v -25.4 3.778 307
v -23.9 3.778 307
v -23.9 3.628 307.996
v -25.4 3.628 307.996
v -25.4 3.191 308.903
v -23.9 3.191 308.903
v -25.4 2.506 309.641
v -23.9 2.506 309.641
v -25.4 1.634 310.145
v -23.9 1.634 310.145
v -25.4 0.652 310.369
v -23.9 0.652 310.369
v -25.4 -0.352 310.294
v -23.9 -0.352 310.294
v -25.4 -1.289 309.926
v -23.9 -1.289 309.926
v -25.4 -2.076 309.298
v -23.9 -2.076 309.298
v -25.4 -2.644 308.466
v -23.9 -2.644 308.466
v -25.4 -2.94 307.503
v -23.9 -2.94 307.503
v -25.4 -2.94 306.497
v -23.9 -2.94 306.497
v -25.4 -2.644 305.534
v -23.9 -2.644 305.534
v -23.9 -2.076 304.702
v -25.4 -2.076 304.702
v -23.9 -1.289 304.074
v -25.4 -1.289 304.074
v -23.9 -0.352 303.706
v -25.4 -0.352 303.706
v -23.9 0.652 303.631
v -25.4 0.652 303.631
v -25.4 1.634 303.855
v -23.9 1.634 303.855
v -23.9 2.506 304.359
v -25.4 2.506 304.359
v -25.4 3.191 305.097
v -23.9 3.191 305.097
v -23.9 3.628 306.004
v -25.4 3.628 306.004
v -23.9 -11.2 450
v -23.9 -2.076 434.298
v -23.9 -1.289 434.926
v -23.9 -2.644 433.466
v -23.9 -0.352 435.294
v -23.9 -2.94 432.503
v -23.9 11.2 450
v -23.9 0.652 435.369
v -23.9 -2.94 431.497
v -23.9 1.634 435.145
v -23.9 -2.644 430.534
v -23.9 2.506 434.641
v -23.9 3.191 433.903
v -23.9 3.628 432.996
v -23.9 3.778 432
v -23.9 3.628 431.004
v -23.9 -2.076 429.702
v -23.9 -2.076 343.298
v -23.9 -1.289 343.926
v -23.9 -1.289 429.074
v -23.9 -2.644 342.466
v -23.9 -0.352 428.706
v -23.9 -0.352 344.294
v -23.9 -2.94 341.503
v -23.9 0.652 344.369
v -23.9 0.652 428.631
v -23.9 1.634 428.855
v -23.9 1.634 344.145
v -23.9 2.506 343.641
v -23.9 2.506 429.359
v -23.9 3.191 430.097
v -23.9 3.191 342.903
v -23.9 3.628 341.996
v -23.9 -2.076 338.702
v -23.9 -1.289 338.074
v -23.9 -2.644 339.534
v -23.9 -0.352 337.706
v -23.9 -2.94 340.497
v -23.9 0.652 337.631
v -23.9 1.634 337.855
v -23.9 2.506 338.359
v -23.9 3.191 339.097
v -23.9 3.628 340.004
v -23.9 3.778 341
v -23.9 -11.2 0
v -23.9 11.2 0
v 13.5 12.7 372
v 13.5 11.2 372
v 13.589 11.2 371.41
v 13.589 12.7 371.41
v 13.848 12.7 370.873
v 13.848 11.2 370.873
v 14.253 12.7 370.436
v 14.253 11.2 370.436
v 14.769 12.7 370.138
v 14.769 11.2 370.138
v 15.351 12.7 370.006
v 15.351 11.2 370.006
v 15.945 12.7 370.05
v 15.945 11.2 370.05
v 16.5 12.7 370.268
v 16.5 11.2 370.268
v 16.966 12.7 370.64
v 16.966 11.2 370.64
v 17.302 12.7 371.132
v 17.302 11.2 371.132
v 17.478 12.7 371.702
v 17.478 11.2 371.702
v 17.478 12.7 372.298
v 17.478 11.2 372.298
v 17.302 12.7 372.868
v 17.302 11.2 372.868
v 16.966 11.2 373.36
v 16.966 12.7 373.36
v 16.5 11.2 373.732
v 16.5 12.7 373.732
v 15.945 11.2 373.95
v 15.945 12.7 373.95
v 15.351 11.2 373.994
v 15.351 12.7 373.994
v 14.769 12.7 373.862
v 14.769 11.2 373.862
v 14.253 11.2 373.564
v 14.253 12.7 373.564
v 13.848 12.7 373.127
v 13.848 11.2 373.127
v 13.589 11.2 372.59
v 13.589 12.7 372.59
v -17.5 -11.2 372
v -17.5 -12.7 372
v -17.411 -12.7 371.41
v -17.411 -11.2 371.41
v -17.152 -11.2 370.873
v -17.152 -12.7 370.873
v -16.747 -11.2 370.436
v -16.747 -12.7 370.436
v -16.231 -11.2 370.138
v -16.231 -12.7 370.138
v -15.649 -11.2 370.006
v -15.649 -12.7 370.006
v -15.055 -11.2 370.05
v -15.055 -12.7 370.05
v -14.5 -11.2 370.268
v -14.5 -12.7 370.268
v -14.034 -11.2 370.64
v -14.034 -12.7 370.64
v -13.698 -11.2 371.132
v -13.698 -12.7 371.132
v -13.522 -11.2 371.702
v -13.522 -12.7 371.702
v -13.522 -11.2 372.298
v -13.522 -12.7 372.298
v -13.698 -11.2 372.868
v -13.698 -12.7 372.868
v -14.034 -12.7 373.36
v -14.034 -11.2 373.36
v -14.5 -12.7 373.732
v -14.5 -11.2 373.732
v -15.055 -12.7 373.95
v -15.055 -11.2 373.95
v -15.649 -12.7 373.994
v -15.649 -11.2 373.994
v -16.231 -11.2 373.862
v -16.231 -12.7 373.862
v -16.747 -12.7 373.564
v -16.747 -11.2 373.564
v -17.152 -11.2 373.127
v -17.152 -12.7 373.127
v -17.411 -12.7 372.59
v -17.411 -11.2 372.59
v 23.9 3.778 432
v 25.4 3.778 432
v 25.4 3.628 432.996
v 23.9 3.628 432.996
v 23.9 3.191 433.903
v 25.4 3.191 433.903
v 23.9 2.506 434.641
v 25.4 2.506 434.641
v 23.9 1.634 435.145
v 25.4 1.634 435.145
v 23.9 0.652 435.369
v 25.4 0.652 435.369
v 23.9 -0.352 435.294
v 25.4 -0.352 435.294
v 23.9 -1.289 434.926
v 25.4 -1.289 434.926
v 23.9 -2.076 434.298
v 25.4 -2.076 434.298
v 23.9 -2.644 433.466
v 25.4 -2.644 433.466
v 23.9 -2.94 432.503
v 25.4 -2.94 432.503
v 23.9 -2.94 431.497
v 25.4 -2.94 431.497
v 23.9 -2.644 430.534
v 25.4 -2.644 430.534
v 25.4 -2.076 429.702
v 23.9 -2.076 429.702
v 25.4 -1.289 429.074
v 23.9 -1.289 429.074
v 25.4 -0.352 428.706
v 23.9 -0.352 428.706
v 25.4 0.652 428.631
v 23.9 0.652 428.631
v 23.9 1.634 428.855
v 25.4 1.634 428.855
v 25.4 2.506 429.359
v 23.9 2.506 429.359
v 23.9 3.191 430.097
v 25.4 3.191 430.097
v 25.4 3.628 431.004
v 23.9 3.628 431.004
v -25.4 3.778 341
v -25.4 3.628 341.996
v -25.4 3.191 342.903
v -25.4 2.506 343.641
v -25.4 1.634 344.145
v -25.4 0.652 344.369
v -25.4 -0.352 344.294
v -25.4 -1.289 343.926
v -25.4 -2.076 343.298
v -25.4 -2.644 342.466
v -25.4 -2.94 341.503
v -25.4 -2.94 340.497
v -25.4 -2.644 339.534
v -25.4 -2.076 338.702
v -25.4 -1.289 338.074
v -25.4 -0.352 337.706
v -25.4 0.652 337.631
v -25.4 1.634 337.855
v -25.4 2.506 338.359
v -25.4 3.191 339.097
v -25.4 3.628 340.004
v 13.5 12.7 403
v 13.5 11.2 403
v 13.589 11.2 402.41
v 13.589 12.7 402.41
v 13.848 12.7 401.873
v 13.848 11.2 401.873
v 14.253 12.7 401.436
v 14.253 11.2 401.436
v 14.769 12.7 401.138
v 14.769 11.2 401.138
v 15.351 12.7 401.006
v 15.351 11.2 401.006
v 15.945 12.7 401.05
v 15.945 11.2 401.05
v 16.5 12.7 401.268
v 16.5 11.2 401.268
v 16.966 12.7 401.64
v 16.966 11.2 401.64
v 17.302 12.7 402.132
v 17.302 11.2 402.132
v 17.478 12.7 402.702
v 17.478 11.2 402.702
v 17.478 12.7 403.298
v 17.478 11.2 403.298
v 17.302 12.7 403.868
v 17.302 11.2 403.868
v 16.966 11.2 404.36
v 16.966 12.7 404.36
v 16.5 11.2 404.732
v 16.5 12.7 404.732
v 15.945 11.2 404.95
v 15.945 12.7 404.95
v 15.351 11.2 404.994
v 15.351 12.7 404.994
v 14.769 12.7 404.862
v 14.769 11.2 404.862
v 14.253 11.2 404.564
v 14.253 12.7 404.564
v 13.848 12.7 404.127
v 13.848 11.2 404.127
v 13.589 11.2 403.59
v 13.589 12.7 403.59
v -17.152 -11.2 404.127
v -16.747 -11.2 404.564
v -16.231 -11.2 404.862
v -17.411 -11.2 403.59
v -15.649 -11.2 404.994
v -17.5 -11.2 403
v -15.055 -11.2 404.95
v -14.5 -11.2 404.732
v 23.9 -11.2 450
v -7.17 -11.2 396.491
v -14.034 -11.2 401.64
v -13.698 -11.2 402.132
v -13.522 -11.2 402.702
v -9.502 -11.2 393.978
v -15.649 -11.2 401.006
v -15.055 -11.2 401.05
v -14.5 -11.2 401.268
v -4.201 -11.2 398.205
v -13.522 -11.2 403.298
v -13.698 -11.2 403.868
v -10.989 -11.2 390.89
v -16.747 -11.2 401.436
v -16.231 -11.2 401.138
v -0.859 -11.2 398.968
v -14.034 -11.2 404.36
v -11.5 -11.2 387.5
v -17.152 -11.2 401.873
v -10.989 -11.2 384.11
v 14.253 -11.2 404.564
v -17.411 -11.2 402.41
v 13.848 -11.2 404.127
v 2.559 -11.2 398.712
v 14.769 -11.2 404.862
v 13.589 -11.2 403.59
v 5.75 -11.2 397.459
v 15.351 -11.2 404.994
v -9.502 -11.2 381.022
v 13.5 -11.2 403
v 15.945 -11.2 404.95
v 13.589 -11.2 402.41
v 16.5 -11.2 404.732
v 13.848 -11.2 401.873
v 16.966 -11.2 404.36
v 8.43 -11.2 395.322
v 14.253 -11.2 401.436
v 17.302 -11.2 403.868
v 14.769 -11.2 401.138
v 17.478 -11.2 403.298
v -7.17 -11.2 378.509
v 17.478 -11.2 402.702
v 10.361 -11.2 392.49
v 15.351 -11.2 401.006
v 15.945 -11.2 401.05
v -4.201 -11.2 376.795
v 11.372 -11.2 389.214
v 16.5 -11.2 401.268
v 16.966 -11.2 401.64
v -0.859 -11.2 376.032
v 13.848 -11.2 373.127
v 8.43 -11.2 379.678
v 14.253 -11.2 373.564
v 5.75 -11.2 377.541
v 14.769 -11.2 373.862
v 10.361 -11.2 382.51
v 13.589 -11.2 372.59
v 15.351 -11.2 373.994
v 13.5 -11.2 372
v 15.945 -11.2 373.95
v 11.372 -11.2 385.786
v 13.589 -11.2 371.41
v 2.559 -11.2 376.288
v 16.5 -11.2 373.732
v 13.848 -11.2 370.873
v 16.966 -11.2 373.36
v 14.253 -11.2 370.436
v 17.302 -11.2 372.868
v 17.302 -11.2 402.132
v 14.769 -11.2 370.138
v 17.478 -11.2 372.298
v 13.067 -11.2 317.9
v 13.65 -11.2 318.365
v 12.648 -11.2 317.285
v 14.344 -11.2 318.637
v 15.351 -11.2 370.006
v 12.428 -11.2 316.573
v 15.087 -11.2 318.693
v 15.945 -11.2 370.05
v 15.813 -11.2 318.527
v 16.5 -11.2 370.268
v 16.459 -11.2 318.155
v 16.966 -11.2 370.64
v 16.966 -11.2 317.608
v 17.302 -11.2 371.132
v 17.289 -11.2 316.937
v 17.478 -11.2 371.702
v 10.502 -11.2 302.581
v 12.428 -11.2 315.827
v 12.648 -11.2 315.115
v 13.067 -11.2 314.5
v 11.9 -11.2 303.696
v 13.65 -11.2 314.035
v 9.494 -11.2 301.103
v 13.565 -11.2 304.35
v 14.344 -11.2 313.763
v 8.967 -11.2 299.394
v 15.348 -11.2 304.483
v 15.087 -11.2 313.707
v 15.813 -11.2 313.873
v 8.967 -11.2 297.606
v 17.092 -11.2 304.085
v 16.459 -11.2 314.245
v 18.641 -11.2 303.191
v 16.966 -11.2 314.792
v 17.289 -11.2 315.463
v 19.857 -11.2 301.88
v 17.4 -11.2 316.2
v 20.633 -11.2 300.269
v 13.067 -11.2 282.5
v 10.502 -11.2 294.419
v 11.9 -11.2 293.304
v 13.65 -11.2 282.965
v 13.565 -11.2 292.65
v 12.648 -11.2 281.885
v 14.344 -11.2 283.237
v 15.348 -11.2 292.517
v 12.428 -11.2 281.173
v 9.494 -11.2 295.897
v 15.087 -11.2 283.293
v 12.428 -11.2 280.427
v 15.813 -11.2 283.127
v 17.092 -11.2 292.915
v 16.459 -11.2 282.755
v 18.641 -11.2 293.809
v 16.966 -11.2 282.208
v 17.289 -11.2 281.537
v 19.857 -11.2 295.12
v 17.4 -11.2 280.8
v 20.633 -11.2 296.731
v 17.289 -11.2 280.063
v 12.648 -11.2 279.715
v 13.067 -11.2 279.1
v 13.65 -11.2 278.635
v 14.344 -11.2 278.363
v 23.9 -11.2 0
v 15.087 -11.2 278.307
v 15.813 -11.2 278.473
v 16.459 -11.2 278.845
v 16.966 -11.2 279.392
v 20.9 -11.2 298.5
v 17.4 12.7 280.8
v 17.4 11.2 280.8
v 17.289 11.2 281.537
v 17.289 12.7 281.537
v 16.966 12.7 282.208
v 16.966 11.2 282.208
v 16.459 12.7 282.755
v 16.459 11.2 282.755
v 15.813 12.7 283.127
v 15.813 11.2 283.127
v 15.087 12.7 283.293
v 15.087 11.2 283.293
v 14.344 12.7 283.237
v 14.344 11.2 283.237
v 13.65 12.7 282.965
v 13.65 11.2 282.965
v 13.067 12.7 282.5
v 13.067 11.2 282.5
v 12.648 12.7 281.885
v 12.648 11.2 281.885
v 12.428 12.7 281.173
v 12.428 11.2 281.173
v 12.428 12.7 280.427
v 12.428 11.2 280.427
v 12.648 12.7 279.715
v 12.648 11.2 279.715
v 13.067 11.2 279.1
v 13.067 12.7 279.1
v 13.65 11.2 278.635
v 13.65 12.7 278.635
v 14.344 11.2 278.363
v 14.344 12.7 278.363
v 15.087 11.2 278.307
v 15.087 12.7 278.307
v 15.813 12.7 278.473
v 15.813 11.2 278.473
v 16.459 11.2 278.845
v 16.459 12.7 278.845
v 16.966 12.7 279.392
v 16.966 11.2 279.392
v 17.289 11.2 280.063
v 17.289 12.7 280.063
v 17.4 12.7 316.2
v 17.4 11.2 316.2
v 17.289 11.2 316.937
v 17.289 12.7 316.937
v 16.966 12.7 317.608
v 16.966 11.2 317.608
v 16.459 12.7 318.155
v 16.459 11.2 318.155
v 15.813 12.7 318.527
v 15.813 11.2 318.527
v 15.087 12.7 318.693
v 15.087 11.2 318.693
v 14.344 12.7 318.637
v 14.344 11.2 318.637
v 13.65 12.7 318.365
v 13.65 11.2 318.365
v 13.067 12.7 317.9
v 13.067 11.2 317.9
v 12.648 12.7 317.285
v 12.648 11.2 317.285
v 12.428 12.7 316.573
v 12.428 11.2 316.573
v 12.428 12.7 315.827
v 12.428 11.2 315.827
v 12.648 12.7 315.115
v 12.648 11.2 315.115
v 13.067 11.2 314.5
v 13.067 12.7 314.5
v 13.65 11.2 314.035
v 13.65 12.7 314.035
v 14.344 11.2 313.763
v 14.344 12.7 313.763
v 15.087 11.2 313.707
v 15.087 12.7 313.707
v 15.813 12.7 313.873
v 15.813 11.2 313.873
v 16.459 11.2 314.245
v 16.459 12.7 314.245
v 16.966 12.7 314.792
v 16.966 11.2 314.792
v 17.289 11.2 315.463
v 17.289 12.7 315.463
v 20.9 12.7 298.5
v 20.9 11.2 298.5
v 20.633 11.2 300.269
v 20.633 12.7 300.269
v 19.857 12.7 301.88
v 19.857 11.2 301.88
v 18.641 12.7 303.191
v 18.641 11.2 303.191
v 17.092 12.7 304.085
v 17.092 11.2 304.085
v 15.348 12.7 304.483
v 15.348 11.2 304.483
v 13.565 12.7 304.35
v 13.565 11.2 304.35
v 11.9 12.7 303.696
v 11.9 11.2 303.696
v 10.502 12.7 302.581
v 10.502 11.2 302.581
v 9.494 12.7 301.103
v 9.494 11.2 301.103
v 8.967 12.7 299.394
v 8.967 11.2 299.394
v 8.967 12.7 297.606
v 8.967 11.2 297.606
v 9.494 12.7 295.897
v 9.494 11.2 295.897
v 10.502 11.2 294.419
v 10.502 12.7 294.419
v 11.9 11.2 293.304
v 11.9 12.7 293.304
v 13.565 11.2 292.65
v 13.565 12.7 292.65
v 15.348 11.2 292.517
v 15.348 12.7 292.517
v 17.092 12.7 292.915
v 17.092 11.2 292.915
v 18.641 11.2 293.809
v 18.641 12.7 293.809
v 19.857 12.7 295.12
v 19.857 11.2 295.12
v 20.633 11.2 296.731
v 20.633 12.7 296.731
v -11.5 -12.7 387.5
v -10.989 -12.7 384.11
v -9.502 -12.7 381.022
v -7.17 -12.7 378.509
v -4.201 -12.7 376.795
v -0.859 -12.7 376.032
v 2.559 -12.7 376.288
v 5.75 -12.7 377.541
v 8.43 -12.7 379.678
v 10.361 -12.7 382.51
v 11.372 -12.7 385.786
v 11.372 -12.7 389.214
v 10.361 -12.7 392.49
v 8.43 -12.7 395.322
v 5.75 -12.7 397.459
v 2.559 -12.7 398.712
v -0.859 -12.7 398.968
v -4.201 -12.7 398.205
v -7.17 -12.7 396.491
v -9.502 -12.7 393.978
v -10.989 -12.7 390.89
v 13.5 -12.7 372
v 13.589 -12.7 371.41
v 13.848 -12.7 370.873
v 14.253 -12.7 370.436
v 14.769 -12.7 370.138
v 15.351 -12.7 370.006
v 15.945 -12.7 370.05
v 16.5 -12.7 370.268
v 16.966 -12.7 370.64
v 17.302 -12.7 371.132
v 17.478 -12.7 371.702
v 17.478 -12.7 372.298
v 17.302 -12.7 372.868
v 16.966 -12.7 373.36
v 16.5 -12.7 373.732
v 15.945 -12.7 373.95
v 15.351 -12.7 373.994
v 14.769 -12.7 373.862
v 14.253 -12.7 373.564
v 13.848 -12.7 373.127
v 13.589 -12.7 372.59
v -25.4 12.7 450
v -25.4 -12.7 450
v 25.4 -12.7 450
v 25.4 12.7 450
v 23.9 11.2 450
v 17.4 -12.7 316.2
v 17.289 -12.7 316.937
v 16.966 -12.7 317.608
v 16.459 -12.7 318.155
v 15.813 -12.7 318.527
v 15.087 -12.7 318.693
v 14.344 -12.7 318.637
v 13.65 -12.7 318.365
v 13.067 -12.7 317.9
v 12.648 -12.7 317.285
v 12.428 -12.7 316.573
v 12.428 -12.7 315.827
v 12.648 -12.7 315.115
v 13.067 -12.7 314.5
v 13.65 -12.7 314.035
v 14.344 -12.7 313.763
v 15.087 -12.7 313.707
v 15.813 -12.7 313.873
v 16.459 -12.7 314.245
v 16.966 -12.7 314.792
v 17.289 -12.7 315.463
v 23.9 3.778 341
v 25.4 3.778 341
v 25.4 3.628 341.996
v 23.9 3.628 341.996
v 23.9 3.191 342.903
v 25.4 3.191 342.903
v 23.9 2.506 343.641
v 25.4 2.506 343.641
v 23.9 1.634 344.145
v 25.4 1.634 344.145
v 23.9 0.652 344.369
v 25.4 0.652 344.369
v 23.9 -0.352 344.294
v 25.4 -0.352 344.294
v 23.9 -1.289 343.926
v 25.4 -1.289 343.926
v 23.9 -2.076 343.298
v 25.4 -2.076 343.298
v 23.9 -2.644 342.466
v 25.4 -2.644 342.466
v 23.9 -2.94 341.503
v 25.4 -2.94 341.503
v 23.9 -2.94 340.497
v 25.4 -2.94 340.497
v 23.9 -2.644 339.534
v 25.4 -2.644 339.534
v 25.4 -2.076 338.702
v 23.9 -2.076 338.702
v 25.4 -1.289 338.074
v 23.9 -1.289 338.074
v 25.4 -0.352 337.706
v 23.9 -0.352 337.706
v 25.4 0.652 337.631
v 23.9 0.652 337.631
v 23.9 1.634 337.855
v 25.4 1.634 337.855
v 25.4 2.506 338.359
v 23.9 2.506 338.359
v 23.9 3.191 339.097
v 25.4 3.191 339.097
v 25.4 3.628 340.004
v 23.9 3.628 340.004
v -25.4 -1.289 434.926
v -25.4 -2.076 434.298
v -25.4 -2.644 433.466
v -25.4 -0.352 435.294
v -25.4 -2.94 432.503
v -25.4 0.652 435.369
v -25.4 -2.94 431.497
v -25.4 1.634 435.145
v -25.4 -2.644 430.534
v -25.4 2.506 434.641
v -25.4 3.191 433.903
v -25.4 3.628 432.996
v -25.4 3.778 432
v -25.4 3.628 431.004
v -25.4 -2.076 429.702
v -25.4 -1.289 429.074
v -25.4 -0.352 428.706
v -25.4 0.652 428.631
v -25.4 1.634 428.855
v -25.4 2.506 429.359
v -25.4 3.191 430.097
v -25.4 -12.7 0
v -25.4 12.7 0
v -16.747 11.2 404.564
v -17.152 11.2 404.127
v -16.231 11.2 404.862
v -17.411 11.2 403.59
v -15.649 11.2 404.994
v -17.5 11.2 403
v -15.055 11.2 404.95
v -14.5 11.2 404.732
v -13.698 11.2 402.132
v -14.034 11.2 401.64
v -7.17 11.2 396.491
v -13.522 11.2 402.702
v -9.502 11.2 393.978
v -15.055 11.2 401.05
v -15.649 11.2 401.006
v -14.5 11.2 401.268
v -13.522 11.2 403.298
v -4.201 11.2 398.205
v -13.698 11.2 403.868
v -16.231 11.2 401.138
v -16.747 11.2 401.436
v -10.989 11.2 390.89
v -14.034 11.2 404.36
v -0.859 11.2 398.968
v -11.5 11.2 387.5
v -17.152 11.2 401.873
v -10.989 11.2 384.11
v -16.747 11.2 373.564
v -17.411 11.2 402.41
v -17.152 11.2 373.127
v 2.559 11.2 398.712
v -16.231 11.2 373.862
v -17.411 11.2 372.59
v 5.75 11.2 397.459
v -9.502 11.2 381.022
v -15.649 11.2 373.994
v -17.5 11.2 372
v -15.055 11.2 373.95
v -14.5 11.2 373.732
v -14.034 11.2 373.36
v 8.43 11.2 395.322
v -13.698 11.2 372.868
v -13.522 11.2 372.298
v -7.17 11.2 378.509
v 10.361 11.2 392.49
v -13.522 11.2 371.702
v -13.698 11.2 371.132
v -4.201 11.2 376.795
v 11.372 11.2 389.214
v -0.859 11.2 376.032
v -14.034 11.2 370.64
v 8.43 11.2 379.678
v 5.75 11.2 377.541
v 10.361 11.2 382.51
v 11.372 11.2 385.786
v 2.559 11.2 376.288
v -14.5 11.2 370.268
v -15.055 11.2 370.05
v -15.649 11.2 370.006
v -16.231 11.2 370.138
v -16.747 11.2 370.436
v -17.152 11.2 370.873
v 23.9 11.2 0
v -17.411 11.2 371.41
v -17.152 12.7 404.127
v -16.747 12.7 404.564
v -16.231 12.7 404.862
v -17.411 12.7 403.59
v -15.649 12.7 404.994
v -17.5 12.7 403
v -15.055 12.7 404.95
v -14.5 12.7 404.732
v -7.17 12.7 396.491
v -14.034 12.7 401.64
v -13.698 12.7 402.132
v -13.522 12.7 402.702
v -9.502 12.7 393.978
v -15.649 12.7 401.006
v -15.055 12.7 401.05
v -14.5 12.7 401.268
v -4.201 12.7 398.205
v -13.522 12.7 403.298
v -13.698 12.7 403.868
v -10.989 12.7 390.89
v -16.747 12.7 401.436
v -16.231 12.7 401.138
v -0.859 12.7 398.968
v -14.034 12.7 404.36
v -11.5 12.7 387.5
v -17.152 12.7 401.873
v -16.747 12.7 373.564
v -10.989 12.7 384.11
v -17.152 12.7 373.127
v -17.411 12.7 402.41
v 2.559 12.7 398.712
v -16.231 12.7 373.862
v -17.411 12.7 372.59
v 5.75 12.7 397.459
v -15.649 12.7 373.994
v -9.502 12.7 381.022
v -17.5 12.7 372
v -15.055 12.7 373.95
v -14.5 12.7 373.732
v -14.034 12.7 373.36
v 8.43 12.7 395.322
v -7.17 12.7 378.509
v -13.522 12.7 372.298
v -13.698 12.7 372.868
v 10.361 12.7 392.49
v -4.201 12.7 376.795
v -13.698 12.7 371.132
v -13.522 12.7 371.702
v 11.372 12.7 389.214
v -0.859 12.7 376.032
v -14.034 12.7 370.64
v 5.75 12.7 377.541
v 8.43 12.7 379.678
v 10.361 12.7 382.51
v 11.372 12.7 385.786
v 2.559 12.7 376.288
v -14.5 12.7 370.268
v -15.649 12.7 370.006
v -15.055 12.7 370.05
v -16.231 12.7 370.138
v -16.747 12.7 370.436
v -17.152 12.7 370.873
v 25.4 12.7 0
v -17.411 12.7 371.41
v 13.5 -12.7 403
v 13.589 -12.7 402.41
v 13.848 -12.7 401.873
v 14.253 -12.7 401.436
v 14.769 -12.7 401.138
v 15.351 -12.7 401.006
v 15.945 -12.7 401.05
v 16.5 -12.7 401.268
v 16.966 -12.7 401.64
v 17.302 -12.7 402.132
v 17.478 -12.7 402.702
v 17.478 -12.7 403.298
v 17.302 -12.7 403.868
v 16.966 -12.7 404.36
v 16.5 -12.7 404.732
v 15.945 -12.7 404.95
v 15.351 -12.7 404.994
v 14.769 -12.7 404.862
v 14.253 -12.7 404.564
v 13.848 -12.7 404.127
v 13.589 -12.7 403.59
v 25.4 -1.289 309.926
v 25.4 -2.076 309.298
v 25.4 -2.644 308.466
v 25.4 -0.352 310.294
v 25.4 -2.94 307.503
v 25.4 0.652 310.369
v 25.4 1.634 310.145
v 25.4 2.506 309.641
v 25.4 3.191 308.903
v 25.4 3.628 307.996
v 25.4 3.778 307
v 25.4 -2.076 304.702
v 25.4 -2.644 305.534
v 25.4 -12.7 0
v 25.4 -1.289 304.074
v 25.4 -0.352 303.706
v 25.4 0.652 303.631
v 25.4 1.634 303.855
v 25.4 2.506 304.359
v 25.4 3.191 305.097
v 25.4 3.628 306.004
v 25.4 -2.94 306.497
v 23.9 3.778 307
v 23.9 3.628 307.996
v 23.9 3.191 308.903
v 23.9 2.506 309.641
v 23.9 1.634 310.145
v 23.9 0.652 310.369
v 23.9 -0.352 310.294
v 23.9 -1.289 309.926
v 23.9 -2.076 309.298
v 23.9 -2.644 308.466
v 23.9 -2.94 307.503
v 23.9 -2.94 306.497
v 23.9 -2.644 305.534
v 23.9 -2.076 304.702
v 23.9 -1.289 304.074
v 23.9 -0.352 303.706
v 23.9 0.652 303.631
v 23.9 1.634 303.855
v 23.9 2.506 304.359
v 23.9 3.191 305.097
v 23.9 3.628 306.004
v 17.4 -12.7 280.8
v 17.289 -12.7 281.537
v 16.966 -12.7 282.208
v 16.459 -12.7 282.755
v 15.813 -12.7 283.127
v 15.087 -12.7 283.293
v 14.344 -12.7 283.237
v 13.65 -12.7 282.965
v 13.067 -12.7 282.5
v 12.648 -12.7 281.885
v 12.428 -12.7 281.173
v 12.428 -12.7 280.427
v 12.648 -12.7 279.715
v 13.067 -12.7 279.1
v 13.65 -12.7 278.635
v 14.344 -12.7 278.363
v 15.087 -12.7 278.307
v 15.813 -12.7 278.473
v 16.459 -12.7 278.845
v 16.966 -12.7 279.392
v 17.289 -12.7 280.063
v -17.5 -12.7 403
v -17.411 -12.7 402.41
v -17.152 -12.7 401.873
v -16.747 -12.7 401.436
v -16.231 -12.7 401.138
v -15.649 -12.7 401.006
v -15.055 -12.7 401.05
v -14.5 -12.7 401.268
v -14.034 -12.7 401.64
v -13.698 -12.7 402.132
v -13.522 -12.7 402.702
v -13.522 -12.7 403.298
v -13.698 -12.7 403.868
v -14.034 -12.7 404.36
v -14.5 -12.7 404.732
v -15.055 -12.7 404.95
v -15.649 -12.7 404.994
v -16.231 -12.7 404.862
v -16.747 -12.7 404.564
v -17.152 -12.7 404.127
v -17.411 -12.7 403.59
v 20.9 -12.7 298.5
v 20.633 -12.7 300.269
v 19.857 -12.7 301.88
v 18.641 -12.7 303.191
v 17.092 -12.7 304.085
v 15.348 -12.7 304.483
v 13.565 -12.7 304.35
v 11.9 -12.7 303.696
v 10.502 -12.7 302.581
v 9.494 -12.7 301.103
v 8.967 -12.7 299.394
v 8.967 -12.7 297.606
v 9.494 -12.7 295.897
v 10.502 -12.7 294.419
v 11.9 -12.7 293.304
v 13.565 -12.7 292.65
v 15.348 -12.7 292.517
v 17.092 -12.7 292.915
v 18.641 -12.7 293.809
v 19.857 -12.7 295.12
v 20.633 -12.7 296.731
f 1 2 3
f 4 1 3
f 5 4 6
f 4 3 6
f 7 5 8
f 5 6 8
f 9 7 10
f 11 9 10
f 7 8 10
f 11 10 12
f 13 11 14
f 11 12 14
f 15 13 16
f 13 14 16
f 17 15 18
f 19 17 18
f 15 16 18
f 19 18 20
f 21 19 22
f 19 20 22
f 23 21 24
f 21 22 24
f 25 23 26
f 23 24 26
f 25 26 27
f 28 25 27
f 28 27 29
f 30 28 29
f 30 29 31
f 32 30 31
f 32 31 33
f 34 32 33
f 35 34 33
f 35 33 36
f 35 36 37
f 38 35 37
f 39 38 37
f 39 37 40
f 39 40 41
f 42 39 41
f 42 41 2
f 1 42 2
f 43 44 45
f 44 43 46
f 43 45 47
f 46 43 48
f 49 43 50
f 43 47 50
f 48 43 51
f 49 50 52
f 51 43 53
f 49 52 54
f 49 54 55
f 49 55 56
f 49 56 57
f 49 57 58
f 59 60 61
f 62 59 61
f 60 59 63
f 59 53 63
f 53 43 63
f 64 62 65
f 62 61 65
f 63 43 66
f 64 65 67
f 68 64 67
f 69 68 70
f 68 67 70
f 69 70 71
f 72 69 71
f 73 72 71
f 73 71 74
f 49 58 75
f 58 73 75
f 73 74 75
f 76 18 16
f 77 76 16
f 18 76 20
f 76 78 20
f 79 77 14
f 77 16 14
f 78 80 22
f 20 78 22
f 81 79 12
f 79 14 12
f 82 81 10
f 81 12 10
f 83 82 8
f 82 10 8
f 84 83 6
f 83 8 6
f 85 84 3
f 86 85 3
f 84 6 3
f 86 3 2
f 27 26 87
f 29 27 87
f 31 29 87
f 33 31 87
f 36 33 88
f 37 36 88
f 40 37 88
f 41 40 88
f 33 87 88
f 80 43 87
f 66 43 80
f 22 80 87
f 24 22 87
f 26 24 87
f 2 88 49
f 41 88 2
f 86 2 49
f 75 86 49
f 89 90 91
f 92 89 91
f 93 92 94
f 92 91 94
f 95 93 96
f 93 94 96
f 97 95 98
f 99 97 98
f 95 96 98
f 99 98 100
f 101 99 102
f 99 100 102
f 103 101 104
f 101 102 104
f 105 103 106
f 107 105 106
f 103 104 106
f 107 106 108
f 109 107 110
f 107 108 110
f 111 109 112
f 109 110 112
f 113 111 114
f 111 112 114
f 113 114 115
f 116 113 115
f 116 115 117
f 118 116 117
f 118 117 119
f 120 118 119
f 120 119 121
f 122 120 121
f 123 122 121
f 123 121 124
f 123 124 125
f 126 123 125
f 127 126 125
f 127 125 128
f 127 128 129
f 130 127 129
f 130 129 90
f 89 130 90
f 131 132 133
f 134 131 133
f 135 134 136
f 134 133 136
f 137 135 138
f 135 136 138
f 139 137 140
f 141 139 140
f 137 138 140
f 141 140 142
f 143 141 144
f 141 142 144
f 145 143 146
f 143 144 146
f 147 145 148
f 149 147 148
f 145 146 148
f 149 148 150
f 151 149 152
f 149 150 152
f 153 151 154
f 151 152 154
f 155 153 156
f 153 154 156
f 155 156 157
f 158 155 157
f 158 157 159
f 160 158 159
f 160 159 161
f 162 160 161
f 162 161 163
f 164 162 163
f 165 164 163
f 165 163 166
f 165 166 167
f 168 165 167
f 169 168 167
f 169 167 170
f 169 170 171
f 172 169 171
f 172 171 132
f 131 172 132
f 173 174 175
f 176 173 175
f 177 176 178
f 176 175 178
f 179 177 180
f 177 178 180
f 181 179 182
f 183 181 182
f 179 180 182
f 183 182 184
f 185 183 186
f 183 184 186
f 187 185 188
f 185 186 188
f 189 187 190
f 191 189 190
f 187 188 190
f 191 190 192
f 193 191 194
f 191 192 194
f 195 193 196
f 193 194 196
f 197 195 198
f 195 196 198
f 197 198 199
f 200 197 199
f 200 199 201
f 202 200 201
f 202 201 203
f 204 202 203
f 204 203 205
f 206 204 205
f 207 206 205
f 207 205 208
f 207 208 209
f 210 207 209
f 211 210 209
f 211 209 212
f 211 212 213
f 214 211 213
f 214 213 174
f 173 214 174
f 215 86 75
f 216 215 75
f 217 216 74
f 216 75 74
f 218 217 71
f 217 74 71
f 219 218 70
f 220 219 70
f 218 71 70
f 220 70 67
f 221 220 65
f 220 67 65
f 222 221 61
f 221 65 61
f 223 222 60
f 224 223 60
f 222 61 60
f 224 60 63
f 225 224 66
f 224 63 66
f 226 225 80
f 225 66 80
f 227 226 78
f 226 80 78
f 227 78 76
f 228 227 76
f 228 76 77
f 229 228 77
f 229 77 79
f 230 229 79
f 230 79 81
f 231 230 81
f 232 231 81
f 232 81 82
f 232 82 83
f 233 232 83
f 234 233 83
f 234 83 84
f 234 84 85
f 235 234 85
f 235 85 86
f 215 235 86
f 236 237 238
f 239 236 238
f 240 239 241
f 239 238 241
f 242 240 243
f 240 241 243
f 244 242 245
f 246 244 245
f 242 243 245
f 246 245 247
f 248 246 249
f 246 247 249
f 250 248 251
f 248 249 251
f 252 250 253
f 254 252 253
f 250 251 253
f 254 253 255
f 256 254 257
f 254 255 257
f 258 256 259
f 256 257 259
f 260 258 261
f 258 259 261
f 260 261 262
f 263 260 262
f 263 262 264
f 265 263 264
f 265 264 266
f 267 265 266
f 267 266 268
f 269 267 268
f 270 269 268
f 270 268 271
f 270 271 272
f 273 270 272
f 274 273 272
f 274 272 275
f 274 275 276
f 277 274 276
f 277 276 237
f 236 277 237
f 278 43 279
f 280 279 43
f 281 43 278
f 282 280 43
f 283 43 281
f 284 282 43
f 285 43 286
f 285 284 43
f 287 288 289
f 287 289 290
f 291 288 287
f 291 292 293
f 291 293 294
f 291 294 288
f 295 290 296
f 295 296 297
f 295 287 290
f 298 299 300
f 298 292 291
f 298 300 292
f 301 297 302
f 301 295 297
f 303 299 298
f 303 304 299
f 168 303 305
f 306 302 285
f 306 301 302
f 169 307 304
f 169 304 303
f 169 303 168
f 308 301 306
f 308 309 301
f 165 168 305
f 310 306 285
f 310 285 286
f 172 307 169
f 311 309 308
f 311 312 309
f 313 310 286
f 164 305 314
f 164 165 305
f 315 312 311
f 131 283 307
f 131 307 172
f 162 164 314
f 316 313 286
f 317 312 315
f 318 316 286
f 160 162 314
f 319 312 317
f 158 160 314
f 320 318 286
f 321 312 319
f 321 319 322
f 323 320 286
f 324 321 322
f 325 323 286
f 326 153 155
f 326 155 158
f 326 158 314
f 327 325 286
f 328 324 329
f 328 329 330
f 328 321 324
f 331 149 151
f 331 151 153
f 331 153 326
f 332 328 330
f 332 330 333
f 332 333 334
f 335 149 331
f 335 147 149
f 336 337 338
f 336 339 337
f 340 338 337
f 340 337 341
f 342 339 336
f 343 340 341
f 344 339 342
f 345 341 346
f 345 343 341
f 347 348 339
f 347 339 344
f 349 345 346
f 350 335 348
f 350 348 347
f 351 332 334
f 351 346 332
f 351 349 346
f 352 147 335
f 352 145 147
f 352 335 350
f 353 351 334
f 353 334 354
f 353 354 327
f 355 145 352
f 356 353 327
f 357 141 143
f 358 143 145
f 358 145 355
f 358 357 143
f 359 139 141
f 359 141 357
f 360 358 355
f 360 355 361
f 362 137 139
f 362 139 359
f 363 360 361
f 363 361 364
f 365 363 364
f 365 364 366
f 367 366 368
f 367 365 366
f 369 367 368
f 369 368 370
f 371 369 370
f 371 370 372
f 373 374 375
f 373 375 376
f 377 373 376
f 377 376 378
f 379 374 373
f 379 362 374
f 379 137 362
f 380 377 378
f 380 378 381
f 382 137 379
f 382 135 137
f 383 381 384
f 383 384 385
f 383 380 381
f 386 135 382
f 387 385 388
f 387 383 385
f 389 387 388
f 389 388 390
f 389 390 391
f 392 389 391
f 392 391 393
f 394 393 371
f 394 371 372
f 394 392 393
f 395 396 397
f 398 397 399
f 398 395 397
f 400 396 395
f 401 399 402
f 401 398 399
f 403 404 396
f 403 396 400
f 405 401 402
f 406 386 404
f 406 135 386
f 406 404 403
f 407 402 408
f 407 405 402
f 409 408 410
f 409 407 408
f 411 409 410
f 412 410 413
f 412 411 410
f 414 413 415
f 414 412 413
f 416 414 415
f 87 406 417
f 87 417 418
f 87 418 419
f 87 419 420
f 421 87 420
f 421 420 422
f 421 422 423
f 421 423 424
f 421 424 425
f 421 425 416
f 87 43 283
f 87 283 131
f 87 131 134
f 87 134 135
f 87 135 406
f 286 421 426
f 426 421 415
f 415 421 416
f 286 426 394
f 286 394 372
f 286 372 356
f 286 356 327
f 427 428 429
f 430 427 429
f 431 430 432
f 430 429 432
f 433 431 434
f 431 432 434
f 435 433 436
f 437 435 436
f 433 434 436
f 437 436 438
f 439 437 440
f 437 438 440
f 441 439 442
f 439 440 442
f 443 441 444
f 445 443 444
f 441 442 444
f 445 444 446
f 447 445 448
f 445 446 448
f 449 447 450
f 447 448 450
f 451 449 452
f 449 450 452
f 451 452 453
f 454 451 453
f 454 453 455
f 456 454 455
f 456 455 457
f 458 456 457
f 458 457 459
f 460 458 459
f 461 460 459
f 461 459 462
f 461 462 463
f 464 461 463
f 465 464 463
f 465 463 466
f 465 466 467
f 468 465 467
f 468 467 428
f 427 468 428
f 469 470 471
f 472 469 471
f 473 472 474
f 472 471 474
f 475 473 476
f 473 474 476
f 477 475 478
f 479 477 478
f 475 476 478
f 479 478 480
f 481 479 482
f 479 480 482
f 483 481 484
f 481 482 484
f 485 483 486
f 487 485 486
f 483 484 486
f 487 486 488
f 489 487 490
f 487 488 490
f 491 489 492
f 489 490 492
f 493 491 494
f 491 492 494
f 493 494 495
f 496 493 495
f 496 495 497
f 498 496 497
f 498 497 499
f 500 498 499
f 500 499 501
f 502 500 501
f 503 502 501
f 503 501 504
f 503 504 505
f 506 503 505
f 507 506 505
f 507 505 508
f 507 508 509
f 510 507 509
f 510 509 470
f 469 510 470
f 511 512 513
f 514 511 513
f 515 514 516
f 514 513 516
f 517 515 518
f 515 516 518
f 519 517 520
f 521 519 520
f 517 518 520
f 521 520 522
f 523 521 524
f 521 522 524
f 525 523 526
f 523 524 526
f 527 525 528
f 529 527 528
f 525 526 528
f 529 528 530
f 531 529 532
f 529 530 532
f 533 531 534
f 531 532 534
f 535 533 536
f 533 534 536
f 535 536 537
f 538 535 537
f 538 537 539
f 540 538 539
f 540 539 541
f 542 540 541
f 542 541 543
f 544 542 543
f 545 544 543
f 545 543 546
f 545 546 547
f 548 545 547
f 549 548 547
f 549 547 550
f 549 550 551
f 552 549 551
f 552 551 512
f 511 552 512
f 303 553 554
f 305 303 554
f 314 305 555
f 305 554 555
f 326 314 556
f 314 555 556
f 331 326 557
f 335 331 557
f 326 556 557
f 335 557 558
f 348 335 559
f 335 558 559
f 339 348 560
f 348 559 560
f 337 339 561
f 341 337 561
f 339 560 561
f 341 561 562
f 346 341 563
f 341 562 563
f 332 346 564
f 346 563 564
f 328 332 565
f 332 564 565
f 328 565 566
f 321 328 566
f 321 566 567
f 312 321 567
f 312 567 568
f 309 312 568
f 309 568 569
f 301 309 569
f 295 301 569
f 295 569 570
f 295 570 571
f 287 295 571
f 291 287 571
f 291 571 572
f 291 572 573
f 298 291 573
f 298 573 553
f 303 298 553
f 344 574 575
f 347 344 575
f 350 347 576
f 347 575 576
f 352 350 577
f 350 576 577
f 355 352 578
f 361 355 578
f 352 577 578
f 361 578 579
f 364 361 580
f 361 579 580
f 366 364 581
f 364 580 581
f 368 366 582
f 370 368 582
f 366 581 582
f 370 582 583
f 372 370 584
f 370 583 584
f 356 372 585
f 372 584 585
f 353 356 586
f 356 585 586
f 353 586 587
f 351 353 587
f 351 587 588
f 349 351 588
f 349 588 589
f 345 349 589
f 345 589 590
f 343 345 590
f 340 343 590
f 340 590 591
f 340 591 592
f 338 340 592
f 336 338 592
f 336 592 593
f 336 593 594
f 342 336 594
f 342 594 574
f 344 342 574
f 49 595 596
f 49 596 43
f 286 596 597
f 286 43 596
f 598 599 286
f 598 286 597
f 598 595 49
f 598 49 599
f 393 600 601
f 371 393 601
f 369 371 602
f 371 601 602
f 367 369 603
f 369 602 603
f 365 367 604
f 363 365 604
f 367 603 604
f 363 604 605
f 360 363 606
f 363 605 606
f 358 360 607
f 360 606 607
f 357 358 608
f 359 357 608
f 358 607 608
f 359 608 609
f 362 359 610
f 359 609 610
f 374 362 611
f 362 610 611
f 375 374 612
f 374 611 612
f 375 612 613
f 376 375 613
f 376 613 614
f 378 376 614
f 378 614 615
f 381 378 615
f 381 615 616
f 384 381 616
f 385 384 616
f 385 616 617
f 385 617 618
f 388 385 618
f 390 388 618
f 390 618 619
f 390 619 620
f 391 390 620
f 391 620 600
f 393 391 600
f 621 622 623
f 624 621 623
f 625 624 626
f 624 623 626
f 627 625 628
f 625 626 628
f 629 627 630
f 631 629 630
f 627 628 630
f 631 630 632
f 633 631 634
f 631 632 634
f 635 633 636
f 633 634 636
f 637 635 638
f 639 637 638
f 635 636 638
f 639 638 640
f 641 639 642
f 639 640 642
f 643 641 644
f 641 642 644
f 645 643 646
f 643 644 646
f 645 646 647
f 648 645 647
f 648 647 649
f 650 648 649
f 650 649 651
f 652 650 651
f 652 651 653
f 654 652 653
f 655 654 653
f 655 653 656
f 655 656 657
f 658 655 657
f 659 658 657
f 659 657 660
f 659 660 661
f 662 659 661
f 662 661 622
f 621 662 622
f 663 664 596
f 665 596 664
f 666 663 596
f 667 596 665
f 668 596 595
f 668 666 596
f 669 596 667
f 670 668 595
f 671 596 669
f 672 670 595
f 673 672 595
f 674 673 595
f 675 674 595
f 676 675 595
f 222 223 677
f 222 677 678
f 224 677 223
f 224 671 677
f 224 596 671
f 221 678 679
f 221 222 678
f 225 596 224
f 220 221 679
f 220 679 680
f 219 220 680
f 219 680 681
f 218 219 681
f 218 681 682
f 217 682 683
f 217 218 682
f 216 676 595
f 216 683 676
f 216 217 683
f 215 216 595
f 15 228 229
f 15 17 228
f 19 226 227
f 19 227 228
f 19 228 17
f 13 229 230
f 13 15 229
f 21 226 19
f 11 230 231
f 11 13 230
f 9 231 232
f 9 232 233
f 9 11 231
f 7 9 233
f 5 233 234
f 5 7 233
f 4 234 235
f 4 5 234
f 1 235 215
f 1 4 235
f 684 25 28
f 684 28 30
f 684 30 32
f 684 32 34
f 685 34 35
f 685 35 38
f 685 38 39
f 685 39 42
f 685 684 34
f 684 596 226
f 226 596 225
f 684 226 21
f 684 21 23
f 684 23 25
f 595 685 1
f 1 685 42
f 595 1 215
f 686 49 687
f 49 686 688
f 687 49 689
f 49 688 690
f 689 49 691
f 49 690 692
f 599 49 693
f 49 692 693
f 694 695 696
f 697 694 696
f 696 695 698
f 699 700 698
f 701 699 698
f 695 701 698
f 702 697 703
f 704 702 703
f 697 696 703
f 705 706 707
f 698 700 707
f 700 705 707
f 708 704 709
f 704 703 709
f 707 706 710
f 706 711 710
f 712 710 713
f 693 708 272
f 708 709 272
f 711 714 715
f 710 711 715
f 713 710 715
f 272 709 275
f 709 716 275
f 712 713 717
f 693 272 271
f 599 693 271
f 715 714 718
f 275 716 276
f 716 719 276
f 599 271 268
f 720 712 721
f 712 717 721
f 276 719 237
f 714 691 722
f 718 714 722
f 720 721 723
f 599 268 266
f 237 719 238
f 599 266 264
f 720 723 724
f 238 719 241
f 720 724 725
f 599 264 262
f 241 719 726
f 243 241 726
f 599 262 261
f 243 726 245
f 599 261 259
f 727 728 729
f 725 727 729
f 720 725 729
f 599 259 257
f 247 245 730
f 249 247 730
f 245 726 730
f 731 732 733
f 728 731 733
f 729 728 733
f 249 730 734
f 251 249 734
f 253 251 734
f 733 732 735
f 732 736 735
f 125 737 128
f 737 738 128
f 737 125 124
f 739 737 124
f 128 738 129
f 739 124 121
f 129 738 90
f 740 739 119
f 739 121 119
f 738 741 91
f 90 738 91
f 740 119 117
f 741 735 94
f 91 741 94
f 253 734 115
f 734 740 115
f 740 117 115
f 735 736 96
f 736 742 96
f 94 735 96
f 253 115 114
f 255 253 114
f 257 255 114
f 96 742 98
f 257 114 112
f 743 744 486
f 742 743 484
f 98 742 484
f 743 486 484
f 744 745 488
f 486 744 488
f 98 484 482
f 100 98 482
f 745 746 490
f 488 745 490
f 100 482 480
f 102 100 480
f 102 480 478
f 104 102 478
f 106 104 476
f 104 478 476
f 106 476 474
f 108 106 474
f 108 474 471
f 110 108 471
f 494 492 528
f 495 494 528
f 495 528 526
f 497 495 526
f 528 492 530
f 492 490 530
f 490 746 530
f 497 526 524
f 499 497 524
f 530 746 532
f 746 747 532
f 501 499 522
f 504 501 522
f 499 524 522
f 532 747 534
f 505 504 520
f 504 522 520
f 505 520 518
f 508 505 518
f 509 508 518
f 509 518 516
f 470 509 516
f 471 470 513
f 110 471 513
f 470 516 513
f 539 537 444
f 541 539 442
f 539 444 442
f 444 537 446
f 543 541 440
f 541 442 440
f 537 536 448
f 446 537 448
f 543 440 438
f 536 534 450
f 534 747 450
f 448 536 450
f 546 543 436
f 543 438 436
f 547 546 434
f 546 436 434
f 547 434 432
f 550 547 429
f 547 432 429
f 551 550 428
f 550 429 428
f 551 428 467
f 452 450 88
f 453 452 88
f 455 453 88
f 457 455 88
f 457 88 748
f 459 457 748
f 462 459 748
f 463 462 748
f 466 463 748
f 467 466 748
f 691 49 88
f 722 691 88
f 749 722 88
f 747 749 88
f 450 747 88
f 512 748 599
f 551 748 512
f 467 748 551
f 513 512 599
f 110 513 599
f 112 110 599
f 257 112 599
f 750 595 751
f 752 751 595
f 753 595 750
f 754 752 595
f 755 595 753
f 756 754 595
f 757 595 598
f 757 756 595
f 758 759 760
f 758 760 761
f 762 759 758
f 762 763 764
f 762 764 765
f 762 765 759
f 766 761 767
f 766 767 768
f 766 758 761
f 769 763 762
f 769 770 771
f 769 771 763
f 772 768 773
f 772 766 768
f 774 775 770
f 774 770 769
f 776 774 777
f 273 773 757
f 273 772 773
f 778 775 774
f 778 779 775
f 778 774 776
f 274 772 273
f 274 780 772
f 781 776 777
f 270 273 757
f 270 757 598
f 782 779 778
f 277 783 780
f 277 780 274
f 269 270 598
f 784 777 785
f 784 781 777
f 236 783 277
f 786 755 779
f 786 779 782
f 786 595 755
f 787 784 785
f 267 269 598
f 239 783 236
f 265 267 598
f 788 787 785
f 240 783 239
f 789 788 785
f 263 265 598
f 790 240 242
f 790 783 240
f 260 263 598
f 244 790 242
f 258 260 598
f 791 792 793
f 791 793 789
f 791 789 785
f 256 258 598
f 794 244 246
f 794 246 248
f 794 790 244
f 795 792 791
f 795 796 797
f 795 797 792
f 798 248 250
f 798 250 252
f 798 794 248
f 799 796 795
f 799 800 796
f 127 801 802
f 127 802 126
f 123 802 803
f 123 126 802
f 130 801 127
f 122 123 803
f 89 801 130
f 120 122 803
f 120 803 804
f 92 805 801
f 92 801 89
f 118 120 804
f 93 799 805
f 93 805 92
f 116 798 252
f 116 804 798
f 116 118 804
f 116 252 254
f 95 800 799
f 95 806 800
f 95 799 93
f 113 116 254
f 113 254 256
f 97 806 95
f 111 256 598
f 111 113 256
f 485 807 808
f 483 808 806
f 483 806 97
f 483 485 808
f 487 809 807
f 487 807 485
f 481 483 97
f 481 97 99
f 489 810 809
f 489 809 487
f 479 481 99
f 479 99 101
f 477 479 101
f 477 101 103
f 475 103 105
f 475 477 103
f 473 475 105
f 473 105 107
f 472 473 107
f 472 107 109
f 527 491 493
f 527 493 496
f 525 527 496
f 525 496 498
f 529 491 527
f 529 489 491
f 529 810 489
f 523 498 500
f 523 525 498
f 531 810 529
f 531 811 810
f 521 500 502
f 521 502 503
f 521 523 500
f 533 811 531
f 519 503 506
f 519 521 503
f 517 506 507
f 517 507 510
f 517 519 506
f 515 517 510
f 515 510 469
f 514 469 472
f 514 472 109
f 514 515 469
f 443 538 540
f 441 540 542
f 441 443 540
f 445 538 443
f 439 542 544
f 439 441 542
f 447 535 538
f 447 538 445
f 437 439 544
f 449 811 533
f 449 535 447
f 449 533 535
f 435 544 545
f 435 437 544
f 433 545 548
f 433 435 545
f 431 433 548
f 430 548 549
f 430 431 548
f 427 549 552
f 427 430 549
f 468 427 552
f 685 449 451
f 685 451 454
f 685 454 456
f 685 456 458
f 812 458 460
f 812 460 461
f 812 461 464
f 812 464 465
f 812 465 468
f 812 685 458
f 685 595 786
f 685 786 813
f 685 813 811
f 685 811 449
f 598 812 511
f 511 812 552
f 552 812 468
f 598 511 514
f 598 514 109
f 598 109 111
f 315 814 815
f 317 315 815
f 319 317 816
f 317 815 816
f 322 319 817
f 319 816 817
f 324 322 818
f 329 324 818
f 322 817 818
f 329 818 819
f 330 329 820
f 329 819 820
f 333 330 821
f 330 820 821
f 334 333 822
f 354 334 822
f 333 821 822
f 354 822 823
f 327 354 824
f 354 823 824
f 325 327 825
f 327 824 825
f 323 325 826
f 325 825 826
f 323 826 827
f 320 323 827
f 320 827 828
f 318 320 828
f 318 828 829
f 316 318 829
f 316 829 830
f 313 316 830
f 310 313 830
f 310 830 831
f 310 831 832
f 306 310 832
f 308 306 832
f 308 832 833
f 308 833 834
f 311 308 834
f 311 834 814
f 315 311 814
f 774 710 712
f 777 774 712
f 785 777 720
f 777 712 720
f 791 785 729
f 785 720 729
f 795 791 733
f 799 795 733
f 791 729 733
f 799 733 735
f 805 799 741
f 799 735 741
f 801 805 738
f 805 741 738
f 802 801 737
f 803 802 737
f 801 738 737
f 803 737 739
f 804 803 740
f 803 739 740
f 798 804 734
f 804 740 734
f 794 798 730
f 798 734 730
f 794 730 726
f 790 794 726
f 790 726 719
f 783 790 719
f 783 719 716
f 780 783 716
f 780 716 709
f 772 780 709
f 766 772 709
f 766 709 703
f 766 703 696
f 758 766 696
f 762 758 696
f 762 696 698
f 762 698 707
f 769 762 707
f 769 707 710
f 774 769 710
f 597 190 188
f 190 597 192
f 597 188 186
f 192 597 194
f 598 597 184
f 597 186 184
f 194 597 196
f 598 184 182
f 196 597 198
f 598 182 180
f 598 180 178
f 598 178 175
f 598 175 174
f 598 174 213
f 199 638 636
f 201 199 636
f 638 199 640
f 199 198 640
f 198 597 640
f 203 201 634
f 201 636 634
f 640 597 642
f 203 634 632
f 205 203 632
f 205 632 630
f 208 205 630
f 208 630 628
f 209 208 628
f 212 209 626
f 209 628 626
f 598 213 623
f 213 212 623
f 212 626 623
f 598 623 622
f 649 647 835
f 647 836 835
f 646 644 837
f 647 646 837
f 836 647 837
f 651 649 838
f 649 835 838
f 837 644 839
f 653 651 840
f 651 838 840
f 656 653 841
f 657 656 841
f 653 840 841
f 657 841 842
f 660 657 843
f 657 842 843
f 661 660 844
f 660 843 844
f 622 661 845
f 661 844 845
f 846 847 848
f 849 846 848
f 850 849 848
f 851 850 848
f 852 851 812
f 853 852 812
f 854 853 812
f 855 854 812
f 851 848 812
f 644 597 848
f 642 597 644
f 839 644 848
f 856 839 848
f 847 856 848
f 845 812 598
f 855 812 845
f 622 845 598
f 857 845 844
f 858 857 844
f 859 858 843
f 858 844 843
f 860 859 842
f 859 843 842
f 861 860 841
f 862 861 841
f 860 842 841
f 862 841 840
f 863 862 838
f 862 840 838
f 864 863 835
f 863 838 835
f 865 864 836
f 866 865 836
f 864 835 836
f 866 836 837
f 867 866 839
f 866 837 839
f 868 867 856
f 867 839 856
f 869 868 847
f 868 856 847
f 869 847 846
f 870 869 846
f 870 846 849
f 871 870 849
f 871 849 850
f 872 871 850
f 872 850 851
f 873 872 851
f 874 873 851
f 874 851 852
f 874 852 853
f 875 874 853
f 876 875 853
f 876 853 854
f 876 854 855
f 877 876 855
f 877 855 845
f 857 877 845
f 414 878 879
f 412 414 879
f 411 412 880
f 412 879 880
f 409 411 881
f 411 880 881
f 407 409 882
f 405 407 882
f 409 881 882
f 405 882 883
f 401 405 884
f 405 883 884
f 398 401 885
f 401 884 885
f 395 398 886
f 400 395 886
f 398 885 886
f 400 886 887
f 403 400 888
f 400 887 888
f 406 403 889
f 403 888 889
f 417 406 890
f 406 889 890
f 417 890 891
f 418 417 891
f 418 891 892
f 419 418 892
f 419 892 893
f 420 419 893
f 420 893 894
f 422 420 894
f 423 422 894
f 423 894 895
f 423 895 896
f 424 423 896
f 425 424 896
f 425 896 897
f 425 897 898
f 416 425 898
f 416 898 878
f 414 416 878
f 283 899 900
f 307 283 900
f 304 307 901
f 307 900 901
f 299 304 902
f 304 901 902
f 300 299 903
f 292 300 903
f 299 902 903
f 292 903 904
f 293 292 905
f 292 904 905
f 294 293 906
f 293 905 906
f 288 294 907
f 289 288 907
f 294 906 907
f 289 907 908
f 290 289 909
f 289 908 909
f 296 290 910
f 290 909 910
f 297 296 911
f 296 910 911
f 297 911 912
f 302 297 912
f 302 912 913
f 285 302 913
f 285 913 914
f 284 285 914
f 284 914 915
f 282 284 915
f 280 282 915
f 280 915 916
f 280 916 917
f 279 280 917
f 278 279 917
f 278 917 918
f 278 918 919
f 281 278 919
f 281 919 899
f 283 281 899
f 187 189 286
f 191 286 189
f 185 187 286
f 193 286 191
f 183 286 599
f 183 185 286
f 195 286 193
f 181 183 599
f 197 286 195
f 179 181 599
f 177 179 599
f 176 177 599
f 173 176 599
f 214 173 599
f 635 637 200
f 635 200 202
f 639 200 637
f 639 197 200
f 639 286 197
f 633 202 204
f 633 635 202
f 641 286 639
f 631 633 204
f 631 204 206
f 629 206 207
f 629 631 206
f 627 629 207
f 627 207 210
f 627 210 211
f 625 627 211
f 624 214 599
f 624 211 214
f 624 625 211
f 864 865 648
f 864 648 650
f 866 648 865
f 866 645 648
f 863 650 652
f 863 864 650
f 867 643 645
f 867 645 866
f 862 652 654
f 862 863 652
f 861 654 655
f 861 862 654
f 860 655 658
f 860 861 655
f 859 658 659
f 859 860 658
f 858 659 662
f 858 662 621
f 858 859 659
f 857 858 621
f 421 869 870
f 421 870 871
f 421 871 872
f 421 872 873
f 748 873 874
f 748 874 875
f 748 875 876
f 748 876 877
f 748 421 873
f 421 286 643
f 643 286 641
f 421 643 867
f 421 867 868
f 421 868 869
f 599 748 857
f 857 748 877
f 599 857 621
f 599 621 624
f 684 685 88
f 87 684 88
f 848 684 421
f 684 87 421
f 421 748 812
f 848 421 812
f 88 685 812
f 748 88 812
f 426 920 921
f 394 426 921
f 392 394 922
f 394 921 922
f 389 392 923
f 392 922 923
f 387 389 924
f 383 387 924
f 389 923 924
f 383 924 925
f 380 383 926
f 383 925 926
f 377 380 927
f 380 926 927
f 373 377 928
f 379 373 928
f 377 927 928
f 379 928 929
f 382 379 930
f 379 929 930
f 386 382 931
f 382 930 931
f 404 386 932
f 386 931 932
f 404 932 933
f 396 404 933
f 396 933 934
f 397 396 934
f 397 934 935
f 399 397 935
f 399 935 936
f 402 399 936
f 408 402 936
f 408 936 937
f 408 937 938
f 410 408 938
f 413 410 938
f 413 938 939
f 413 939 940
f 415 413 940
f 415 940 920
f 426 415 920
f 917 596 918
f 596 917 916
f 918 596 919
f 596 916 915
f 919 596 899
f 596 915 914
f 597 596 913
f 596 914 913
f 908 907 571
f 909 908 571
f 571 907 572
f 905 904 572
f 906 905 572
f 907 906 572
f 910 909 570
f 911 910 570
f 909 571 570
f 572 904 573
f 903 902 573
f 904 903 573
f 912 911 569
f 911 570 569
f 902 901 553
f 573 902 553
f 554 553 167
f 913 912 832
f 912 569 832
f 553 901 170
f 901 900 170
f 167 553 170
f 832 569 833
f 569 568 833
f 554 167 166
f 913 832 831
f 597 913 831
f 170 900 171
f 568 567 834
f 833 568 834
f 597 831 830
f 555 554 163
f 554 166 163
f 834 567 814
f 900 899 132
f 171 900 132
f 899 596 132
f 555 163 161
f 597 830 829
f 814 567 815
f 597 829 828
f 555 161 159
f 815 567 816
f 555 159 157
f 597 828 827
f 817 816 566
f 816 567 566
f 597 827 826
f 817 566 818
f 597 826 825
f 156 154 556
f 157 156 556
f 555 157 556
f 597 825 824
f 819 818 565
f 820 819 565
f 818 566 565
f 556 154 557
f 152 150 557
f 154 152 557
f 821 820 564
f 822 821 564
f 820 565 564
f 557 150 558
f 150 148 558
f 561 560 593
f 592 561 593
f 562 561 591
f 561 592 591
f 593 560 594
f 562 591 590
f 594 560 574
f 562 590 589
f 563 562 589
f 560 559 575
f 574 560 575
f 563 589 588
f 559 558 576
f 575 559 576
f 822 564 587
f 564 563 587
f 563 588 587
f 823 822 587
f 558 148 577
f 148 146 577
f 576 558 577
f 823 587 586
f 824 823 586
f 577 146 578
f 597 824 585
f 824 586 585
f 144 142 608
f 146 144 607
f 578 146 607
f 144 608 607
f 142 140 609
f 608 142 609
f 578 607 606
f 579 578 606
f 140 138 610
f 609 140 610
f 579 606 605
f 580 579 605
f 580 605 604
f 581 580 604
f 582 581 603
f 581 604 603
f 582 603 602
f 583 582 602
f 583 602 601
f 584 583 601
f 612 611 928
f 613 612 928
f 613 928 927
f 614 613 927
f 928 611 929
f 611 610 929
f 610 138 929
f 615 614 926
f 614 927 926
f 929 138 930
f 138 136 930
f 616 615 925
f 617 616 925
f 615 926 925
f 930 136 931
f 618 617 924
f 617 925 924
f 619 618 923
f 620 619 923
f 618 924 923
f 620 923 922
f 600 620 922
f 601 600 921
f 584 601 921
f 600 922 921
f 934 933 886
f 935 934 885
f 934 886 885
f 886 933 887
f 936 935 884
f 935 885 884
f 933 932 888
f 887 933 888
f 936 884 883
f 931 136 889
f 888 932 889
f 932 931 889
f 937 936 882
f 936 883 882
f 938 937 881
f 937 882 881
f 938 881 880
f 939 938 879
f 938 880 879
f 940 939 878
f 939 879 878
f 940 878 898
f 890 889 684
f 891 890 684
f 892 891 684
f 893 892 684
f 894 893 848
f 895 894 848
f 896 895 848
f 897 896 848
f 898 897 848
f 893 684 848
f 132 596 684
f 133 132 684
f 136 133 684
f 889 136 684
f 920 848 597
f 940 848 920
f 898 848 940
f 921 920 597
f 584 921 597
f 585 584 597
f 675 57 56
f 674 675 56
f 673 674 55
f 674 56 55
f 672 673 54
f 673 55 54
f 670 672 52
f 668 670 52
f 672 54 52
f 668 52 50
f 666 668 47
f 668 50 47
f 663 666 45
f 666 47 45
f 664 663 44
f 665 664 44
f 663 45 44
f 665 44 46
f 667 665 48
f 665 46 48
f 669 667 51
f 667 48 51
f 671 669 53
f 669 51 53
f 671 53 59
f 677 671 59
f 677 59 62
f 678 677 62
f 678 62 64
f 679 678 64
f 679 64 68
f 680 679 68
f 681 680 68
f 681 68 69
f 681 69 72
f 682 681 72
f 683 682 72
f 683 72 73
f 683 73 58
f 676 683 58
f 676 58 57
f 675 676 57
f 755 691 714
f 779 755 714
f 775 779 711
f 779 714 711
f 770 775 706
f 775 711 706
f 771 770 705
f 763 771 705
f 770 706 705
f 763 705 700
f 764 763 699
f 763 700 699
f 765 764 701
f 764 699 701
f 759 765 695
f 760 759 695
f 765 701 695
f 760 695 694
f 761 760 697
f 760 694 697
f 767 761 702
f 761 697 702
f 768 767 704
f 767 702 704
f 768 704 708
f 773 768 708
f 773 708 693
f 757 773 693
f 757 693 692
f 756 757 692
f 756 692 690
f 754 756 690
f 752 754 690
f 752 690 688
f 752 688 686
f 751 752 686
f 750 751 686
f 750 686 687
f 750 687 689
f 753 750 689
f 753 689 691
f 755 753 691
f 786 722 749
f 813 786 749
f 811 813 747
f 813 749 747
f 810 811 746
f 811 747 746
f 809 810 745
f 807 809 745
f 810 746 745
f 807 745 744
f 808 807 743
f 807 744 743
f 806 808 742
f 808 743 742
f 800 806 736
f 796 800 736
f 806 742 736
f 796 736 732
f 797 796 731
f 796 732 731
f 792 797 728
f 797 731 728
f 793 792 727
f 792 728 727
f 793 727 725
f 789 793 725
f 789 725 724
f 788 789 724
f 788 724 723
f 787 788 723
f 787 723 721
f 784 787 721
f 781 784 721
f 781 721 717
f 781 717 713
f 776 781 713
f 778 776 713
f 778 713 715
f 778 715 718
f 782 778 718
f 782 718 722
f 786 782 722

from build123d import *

# Parameters (mm, degrees)
CROQUIS1_W                    = 50.8
CROQUIS1_H                    = 25.4
CROQUIS1_W_2                  = 47.8
CROQUIS1_H_2                  = 22.4
SALIENTE_EXTRUIR1_DEPTH       = 450
CROQUIS2_R                    = 11.5
CROQUIS2_R_2                  = 2
CORTAR_EXTRUIR1_DEPTH         = 26
TALADRO_DE_MARGEN_PARA_1_41_D = 6.7564
CROQUIS5_R                    = 6
CROQUIS5_R_2                  = 2.5
CORTAR_EXTRUIR2_DEPTH         = 25.4


with BuildPart() as part:
    # Croquis1 → Saliente-Extruir1 (new body)
    with BuildSketch(Plane.XY):
        Rectangle(CROQUIS1_W, CROQUIS1_H)
        Rectangle(CROQUIS1_W_2, CROQUIS1_H_2, mode=Mode.SUBTRACT)
    extrude(amount=SALIENTE_EXTRUIR1_DEPTH)

    # Croquis2 → Cortar-Extruir1 (cut)
    with BuildSketch(Plane(origin=(0, -12.7, 0), x_dir=(-1, 0, 0), z_dir=(0, -1, 0))):
        with Locations((0, -387.5)):
            Circle(CROQUIS2_R)
        with Locations((15.5, -403)):
            Circle(CROQUIS2_R_2)
        with Locations((-15.5, -403)):
            Circle(CROQUIS2_R_2)
        with Locations((-15.5, -372)):
            Circle(CROQUIS2_R_2)
        with Locations((15.5, -372)):
            Circle(CROQUIS2_R_2)
    extrude(amount=-CORTAR_EXTRUIR1_DEPTH, mode=Mode.SUBTRACT)

    # Taladro de margen para 1/41 (through all)
    with Locations(Plane(origin=(-25.4, 197.888619806, 162.989101594), x_dir=(0, -1, 0), z_dir=(-1, 0, 0))):
        with Locations((197.488619806, 269.010898406), (197.488619806, 178.010898406), (197.488619806, 144.010898406), (572.888619806, 144.010898406), (572.888619806, 178.010898406), (572.888619806, 269.010898406)):
            Hole(TALADRO_DE_MARGEN_PARA_1_41_D / 2)

    # Croquis5 → Cortar-Extruir2 (cut)
    with BuildSketch(Plane.XZ.offset(12.7)):
        with Locations((14.9, 298.5)):
            Circle(CROQUIS5_R)
        with Locations((14.9, 316.2)):
            Circle(CROQUIS5_R_2)
        with Locations((14.9, 280.8)):
            Circle(CROQUIS5_R_2)
    extrude(amount=-CORTAR_EXTRUIR2_DEPTH, mode=Mode.SUBTRACT)


solid = part.part
